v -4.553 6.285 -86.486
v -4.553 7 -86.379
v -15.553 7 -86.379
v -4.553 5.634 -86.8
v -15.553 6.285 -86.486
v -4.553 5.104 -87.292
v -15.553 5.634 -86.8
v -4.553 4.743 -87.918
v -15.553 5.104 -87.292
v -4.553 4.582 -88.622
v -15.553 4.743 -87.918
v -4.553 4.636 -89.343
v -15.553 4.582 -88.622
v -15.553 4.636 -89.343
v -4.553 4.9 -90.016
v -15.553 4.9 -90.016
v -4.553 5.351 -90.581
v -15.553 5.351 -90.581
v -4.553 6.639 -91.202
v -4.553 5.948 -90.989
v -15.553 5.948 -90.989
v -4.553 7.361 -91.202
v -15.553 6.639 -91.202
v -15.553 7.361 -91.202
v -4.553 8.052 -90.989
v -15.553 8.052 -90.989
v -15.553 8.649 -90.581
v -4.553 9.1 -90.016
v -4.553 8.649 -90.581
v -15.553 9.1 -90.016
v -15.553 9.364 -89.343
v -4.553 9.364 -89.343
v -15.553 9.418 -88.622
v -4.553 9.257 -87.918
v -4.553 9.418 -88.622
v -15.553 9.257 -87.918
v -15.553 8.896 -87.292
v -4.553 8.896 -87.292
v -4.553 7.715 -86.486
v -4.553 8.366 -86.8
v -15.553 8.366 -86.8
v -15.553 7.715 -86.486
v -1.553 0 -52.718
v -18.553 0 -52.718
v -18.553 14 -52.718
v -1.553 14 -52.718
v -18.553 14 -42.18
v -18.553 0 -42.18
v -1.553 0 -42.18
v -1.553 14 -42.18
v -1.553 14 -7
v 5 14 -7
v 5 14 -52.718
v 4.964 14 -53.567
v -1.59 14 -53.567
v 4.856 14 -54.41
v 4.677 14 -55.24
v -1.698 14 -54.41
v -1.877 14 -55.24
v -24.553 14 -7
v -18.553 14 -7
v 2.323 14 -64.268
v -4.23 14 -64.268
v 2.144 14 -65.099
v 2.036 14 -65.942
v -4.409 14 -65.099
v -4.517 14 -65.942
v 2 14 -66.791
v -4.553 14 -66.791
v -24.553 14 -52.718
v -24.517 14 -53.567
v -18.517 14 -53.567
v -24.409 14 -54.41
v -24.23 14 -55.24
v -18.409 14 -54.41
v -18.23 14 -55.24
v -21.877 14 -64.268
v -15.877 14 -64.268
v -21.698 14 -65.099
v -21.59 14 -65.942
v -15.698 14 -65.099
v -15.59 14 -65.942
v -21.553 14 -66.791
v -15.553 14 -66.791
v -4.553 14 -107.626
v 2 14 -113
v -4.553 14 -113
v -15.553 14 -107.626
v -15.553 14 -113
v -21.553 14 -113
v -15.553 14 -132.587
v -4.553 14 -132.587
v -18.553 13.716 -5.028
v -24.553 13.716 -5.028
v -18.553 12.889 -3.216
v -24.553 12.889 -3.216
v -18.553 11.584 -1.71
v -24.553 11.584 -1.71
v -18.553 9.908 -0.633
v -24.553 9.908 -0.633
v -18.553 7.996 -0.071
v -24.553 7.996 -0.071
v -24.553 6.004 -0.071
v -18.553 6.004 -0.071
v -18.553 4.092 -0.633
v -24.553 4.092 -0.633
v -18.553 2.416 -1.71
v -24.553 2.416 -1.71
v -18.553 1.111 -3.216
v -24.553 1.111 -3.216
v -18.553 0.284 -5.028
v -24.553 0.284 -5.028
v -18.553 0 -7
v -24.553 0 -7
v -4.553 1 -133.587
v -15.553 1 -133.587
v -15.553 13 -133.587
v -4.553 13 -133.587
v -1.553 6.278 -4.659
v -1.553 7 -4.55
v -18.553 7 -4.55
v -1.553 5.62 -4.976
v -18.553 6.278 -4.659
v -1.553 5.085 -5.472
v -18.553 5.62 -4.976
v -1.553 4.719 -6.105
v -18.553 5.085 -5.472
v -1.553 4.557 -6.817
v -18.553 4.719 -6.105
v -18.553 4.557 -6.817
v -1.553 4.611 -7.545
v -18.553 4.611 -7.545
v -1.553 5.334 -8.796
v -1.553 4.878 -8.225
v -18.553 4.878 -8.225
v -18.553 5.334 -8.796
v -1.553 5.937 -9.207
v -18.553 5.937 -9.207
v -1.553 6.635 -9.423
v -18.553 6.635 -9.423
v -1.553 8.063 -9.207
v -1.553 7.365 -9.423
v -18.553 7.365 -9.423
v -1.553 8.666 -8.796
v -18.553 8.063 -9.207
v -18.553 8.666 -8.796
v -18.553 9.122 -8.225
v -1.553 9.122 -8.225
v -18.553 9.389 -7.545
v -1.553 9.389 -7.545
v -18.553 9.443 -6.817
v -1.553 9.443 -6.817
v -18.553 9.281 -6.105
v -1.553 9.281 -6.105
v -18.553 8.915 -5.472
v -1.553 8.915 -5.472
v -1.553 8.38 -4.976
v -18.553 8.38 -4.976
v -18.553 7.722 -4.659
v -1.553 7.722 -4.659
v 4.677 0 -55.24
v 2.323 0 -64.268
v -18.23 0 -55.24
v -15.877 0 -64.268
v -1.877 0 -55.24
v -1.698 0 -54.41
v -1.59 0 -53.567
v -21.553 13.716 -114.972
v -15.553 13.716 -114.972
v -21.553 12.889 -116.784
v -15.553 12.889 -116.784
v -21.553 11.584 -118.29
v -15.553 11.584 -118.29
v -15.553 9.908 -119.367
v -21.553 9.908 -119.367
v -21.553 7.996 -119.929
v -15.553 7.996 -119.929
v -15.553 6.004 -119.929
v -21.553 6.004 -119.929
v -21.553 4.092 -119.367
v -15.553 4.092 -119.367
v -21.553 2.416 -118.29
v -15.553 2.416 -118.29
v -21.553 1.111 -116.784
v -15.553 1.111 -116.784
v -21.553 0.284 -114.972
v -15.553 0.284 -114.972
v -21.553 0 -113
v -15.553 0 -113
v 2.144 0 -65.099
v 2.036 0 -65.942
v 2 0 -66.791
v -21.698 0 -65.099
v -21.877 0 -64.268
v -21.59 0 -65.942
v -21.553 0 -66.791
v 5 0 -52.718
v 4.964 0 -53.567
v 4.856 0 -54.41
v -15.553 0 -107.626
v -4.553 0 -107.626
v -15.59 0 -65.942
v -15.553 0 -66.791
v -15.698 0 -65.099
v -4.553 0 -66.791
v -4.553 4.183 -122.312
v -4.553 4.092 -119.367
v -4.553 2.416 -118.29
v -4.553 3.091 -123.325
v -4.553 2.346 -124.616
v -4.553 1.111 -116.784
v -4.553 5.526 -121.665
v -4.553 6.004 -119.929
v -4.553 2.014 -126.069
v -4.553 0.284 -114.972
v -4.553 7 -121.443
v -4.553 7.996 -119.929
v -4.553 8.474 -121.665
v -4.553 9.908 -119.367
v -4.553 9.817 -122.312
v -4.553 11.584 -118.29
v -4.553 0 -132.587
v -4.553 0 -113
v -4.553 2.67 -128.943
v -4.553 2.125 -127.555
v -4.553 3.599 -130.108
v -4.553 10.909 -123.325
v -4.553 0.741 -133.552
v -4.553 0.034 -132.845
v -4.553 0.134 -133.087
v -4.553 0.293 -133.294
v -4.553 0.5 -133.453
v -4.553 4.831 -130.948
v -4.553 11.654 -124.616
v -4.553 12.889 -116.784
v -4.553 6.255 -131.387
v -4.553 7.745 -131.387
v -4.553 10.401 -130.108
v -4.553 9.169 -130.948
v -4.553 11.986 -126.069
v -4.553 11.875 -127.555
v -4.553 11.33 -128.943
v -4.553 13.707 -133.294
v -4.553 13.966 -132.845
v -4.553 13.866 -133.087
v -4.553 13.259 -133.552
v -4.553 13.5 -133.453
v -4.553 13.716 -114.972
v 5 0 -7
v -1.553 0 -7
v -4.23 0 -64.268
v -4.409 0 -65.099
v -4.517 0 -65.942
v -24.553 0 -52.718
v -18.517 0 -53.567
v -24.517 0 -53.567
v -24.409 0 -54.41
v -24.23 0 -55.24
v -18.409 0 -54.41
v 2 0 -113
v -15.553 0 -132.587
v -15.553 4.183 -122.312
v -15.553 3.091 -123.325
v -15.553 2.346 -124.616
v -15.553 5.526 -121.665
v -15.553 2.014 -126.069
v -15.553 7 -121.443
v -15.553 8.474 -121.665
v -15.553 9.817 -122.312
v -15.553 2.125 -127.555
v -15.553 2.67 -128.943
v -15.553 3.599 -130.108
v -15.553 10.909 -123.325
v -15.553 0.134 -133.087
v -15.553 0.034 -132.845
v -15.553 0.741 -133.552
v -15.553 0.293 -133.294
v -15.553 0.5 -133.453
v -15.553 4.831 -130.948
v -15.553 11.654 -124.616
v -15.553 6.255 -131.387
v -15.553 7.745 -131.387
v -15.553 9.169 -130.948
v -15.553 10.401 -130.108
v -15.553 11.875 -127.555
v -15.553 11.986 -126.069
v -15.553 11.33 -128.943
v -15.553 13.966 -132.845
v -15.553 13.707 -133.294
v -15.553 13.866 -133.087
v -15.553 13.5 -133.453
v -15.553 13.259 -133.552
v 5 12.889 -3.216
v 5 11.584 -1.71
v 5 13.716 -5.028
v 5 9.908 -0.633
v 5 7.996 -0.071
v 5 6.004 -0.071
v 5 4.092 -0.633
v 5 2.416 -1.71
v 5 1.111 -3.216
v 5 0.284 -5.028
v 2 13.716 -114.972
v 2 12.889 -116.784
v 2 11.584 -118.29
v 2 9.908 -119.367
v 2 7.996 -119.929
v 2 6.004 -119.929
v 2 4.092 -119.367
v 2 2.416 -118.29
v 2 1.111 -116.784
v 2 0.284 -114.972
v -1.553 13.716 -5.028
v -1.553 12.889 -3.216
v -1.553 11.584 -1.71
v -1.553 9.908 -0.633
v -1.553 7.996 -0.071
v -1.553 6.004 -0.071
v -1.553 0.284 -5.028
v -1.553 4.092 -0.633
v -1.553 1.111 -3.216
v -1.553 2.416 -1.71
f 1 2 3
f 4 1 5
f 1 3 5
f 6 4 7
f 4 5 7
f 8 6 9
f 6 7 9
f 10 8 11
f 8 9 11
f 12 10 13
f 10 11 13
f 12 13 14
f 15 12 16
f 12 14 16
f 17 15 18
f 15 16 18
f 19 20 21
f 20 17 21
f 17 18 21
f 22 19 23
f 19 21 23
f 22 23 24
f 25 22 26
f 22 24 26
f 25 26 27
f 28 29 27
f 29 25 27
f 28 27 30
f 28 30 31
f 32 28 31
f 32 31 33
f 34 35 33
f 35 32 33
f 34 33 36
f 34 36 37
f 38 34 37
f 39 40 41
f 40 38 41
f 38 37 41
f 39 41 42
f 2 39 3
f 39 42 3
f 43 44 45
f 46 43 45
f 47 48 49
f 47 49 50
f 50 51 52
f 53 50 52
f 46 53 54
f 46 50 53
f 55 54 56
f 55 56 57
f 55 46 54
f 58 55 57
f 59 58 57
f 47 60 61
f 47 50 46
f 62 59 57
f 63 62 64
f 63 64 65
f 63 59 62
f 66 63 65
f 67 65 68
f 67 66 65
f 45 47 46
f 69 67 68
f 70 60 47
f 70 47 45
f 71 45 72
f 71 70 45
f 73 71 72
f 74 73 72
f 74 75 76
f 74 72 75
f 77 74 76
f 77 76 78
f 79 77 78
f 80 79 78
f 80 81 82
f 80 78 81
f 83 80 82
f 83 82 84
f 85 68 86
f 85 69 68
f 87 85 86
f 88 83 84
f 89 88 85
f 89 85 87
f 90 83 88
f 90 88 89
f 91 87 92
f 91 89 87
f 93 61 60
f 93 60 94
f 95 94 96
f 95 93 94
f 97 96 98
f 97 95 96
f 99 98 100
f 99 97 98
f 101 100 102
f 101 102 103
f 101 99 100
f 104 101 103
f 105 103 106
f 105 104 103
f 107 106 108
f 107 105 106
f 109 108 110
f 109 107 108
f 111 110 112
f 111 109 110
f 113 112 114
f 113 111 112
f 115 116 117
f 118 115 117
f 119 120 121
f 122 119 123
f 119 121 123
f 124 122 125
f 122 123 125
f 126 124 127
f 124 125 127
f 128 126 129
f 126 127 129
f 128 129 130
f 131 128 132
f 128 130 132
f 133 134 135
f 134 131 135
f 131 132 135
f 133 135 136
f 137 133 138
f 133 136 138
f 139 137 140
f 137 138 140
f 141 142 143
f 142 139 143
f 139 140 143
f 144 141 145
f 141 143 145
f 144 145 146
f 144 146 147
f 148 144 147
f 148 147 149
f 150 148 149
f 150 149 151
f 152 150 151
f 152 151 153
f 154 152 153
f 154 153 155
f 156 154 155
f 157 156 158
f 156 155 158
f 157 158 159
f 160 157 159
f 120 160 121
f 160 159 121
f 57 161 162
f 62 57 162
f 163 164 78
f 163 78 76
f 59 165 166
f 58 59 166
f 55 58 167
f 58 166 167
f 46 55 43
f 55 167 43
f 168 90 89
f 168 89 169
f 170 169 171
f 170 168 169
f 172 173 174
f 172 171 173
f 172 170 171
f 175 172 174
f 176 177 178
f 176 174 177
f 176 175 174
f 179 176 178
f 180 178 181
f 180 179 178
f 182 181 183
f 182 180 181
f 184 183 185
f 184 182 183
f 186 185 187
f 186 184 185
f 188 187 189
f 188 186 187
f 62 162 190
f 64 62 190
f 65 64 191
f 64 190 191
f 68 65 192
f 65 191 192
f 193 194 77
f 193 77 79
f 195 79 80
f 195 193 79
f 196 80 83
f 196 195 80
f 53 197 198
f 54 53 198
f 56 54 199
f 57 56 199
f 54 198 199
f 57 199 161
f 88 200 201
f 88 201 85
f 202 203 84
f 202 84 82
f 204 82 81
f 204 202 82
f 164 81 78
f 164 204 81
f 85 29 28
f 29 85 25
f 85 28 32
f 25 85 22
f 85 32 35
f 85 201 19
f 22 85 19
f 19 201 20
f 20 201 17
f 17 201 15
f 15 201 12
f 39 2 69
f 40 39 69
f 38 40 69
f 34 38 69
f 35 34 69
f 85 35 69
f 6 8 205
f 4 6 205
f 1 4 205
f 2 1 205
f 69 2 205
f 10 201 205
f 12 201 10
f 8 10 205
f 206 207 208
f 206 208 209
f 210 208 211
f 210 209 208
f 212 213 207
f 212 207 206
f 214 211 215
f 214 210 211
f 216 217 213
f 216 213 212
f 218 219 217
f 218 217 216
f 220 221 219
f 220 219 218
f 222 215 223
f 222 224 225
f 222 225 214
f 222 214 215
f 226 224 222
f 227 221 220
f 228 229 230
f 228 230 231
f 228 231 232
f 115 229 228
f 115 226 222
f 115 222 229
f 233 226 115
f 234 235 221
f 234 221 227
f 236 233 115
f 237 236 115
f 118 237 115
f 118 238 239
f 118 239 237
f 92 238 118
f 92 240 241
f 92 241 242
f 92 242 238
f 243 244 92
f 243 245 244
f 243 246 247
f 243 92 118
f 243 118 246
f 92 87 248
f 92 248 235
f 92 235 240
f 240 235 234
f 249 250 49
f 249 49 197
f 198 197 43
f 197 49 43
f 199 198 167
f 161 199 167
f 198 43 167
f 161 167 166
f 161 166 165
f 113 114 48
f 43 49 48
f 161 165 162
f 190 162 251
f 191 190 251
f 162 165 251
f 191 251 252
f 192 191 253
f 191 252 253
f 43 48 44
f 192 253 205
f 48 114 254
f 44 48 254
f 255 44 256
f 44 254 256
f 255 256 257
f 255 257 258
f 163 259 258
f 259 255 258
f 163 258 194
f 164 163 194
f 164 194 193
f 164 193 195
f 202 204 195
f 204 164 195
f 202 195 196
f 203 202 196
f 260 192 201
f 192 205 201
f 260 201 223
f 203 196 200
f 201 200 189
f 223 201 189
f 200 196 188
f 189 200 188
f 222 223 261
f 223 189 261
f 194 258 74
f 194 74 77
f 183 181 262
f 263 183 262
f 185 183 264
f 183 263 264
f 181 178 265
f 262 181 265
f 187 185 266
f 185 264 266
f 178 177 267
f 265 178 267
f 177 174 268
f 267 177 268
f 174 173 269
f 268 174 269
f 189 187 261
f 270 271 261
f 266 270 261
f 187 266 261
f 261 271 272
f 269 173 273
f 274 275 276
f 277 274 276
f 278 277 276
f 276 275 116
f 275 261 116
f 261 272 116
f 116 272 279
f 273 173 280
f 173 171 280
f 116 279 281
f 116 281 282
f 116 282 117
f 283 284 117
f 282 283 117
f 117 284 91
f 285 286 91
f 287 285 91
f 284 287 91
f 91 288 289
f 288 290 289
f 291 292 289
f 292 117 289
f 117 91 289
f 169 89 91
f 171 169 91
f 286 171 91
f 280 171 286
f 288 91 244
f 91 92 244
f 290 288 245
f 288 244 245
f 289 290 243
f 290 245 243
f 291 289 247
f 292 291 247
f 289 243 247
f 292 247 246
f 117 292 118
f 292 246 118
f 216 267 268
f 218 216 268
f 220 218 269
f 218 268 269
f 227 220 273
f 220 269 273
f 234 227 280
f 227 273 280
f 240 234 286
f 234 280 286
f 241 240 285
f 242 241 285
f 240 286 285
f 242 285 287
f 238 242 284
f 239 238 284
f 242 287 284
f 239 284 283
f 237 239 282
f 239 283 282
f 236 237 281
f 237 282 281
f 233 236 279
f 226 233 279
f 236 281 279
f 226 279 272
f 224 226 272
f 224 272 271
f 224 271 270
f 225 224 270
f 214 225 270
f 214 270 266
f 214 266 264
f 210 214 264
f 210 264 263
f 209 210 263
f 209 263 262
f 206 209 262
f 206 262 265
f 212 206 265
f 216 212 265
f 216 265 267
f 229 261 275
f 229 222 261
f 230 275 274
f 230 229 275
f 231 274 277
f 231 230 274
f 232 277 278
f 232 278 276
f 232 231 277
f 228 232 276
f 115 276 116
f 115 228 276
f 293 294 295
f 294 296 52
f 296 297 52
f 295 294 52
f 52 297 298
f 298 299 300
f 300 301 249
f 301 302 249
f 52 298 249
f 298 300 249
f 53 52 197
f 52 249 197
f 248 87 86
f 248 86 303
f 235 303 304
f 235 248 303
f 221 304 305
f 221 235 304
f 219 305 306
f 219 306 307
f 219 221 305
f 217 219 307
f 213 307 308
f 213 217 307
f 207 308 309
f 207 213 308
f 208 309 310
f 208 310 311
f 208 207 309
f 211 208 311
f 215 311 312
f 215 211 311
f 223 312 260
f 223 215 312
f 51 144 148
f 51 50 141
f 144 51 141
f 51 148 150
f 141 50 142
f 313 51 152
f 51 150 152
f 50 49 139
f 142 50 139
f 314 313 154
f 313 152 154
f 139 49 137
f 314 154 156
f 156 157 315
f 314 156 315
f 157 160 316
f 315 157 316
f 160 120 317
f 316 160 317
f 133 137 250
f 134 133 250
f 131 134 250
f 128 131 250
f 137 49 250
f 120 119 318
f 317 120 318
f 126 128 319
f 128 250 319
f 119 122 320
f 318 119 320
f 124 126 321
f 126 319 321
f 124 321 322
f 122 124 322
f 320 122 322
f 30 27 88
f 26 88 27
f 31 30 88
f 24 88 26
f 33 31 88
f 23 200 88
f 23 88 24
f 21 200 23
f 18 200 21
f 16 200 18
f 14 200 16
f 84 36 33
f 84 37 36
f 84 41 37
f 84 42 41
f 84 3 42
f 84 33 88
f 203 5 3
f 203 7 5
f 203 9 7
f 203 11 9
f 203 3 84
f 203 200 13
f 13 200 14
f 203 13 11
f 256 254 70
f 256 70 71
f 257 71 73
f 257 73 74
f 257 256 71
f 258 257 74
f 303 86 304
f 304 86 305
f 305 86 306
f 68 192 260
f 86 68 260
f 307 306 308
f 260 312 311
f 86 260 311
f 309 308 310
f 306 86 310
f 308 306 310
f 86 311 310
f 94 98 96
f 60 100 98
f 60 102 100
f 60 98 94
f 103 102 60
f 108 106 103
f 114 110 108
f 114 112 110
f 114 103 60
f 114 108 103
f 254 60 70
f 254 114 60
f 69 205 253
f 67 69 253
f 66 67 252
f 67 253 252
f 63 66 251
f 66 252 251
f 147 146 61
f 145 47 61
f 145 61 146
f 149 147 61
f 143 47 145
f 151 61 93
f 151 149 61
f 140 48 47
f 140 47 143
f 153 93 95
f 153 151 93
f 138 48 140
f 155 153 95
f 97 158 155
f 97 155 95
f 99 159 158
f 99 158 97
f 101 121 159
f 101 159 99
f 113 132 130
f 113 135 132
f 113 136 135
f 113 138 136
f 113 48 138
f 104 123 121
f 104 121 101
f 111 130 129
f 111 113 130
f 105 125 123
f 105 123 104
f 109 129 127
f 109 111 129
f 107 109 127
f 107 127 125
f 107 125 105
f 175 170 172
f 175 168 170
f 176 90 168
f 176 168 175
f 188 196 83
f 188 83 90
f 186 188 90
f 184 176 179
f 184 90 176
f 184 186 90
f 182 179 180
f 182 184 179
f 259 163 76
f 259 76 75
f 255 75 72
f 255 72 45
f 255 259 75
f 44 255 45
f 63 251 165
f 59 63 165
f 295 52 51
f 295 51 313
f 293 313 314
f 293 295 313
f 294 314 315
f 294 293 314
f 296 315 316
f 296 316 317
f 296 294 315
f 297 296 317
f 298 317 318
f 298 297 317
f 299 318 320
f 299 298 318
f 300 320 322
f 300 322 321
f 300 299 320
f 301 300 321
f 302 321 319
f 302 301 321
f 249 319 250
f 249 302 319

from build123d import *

# Parameters (mm, degrees)
EXTRUDE_2_DEPTH     = 14
FILLET_1_RADIUS     = 7
FILLET_1_LENGTH     = 6.553419282
FILLET_2_RADIUS     = 7
FILLET_2_LENGTH     = 6.553419282
EXTRUDE_3_DEPTH     = 14
FILLET_3_RADIUS     = 7
FILLET_3_LENGTH     = 6
FILLET_4_RADIUS     = 7
FILLET_4_LENGTH     = 6
EXTRUDE_5_REACH     = 125.088
SKETCH_8_R          = 2.45
SKETCH_8_W          = 10.538484084
SKETCH_8_H          = 14
EXTRUDE_6_REACH     = 124.55
SKETCH_11_R         = 2.425
SKETCH_13_W         = 25.960961566
SKETCH_13_H         = 14
EXTRUDE_7_DEPTH     = 11
CUT_EXTRUDE_2_REACH = 137.882
SKETCH_14_R         = 5
FILLET_5_R          = 1


with BuildPart() as part:
    # 草图1 → 凸台-拉伸2 (new body)
    with BuildSketch(Plane(origin=(0, 0, 0), x_dir=(1, 0, 0), z_dir=(0, 1, 0))):
        with BuildLine():
            Line((5, 0), (5, 52.718048915))
            ThreePointArc((5, 52.718048915), (4.918829182, 53.989594298), (4.676634468, 55.240497206))
            Line((4.676634468, 55.240497206), (2.323365532, 64.268124597))
            ThreePointArc((2.323365532, 64.268124597), (2.081170818, 65.519027505), (2, 66.790572889))
            Line((2, 66.790572889), (2, 120))
            Line((2, 120), (-4.553419282, 120))
            Line((-4.553419282, 120), (-4.553419282, 66.790572889))
            ThreePointArc((-4.553419282, 66.790572889), (-4.472248464, 65.519027505), (-4.23005375, 64.268124597))
            Line((-4.23005375, 64.268124597), (-1.876784815, 55.240497206))
            ThreePointArc((-1.876784815, 55.240497206), (-1.6345901, 53.989594298), (-1.553419282, 52.718048915))
            Line((-1.553419282, 52.718048915), (-1.553419282, 0))
            Line((-1.553419282, 0), (5, 0))
        make_face()
    extrude(amount=EXTRUDE_2_DEPTH)

    # 圆角1: full round fillet: the end face becomes a half cylinder, R = half its width
    fillet_1_face = Plane((1.723290359, 7, 0), x_dir=(1, 0, 0), z_dir=(0, 0, 1))  # on the end face: x along it, z out of the body
    fillet_1_slab = fillet_1_face.offset(-FILLET_1_RADIUS / 2) * Box(FILLET_1_LENGTH, 2 * FILLET_1_RADIUS, FILLET_1_RADIUS, mode=Mode.PRIVATE)  # the body's end, R deep
    fillet_1_round = Plane((1.723290359, 7, -7), x_dir=(0, 0, 1), z_dir=(1, 0, 0)) * Cylinder(FILLET_1_RADIUS, FILLET_1_LENGTH, mode=Mode.PRIVATE)  # its axis R under the face
    add(fillet_1_slab - fillet_1_round, mode=Mode.SUBTRACT)

    # 圆角2: full round fillet: the end face becomes a half cylinder, R = half its width
    fillet_2_face = Plane((-1.276709641, 7, -120), x_dir=(-1, 0, 0), z_dir=(0, 0, -1))  # on the end face: x along it, z out of the body
    fillet_2_slab = fillet_2_face.offset(-FILLET_2_RADIUS / 2) * Box(FILLET_2_LENGTH, 2 * FILLET_2_RADIUS, FILLET_2_RADIUS, mode=Mode.PRIVATE)  # the body's end, R deep
    fillet_2_round = Plane((-1.276709641, 7, -113), x_dir=(0, 0, -1), z_dir=(-1, 0, 0)) * Cylinder(FILLET_2_RADIUS, FILLET_2_LENGTH, mode=Mode.PRIVATE)  # its axis R under the face
    add(fillet_2_slab - fillet_2_round, mode=Mode.SUBTRACT)

    # 草图8 → 凸台-拉伸5 (add, up to next)
    with BuildSketch(Plane(origin=(-18.553419282, 0, 0), x_dir=(0, 0, -1), z_dir=(1, 0, 0)), mode=Mode.PRIVATE) as extrude_5_sk1:
        with Locations(Location((7, 7, 0), (0, 0, 180))):
            Circle(SKETCH_8_R)
    extrude_5_tool1 = extrude(extrude_5_sk1.sketch, amount=EXTRUDE_5_REACH, mode=Mode.PRIVATE) - part.part
    # 草图8 → 凸台-拉伸5 (add, up to next)
    with BuildSketch(Plane(origin=(-18.553419282, 0, 0), x_dir=(0, 0, -1), z_dir=(1, 0, 0)), mode=Mode.PRIVATE) as extrude_5_sk2:
        with Locations((47.448806873, 7)):
            Rectangle(SKETCH_8_W, SKETCH_8_H)
    extrude_5_tool2 = extrude(extrude_5_sk2.sketch, amount=EXTRUDE_5_REACH, mode=Mode.PRIVATE) - part.part


with BuildPart() as body_2:
    # 草图4 → 凸台-拉伸3 (new body)
    with BuildSketch(Plane(origin=(0, 0, 0), x_dir=(1, 0, 0), z_dir=(0, 1, 0))):
        with BuildLine():
            Line((-18.553419282, 0), (-24.553419282, 0))
            Line((-24.553419282, 0), (-24.553419282, 52.718048915))
            ThreePointArc((-24.553419282, 52.718048915), (-24.472248464, 53.989594298), (-24.23005375, 55.240497206))
            Line((-24.23005375, 55.240497206), (-21.876784815, 64.268124597))
            ThreePointArc((-21.876784815, 64.268124597), (-21.6345901, 65.519027505), (-21.553419282, 66.790572889))
            Line((-21.553419282, 66.790572889), (-21.553419282, 120))
            Line((-21.553419282, 120), (-15.553419282, 120))
            Line((-15.553419282, 120), (-15.553419282, 66.790572889))
            ThreePointArc((-15.553419282, 66.790572889), (-15.6345901, 65.519027505), (-15.876784815, 64.268124597))
            Line((-15.876784815, 64.268124597), (-18.23005375, 55.240497206))
            ThreePointArc((-18.23005375, 55.240497206), (-18.472248464, 53.989594298), (-18.553419282, 52.718048915))
            Line((-18.553419282, 52.718048915), (-18.553419282, 0))
        make_face()
    extrude(amount=EXTRUDE_3_DEPTH)

    # 圆角3: full round fillet: the end face becomes a half cylinder, R = half its width
    fillet_3_face = Plane((-18.553419282, 7, -120), x_dir=(-1, 0, 0), z_dir=(0, 0, -1))  # on the end face: x along it, z out of the body
    fillet_3_slab = fillet_3_face.offset(-FILLET_3_RADIUS / 2) * Box(FILLET_3_LENGTH, 2 * FILLET_3_RADIUS, FILLET_3_RADIUS, mode=Mode.PRIVATE)  # the body's end, R deep
    fillet_3_round = Plane((-18.553419282, 7, -113), x_dir=(0, 0, -1), z_dir=(-1, 0, 0)) * Cylinder(FILLET_3_RADIUS, FILLET_3_LENGTH, mode=Mode.PRIVATE)  # its axis R under the face
    add(fillet_3_slab - fillet_3_round, mode=Mode.SUBTRACT)

    # 圆角4: full round fillet: the end face becomes a half cylinder, R = half its width
    fillet_4_face = Plane((-21.553419282, 7, 0), x_dir=(1, 0, 0), z_dir=(0, 0, 1))  # on the end face: x along it, z out of the body
    fillet_4_slab = fillet_4_face.offset(-FILLET_4_RADIUS / 2) * Box(FILLET_4_LENGTH, 2 * FILLET_4_RADIUS, FILLET_4_RADIUS, mode=Mode.PRIVATE)  # the body's end, R deep
    fillet_4_round = Plane((-21.553419282, 7, -7), x_dir=(0, 0, 1), z_dir=(1, 0, 0)) * Cylinder(FILLET_4_RADIUS, FILLET_4_LENGTH, mode=Mode.PRIVATE)  # its axis R under the face
    add(fillet_4_slab - fillet_4_round, mode=Mode.SUBTRACT)


with BuildPart() as part_1:
    add(part.part)

    add(body_2.part)  # 凸台-拉伸5 merges body 2
    add(extrude_5_tool1.solids().sort_by_distance((-18.553419, 7, -7))[0])
    add(extrude_5_tool2.solids().sort_by_distance((-18.553419, 7, -47.448807))[0])

    # 草图11 → 凸台-拉伸6 (add, up to next)
    with BuildSketch(Plane(origin=(-15.553419282, 0, 0), x_dir=(0, 0, -1), z_dir=(1, 0, 0)), mode=Mode.PRIVATE) as extrude_6_sk1:
        with Locations(Location((88.803678257, 7, 0), (0, 0, 180))):
            Circle(SKETCH_11_R)
    extrude_6_tool1 = extrude(extrude_6_sk1.sketch, amount=EXTRUDE_6_REACH, mode=Mode.PRIVATE) - part_1.part
    add(extrude_6_tool1.solids().sort_by_distance((-15.553419, 7, -88.803678))[0])

    # 草图13 → 凸台-拉伸7 (add)
    with BuildSketch(Plane(origin=(-15.553419282, 0, 0), x_dir=(0, 0, -1), z_dir=(1, 0, 0))):
        with Locations((120.606040711, 7)):
            Rectangle(SKETCH_13_W, SKETCH_13_H)
    extrude(amount=EXTRUDE_7_DEPTH)

    # 草图14 → 切除-拉伸2 (cut, up to next)
    with BuildSketch(Plane.ZY.offset(15.553419282), mode=Mode.PRIVATE) as cut_extrude_2_sk1:
        with Locations((-126.442783906, 7)):
            Circle(SKETCH_14_R)
    cut_extrude_2_tool1 = extrude(cut_extrude_2_sk1.sketch, amount=-CUT_EXTRUDE_2_REACH, mode=Mode.PRIVATE) & part_1.part
    add(cut_extrude_2_tool1.solids().sort_by_distance((-15.553419, 7, -126.442784))[0], mode=Mode.SUBTRACT)

    # 圆角5
    fillet_5_edges = [part_1.edges().sort_by_distance(p)[0] for p in [
        (-10.053419282, 0, -133.586521494),
        (-10.053419282, 14, -133.586521494),
    ]]
    fillet(fillet_5_edges, radius=FILLET_5_R)


solid = part_1.part
